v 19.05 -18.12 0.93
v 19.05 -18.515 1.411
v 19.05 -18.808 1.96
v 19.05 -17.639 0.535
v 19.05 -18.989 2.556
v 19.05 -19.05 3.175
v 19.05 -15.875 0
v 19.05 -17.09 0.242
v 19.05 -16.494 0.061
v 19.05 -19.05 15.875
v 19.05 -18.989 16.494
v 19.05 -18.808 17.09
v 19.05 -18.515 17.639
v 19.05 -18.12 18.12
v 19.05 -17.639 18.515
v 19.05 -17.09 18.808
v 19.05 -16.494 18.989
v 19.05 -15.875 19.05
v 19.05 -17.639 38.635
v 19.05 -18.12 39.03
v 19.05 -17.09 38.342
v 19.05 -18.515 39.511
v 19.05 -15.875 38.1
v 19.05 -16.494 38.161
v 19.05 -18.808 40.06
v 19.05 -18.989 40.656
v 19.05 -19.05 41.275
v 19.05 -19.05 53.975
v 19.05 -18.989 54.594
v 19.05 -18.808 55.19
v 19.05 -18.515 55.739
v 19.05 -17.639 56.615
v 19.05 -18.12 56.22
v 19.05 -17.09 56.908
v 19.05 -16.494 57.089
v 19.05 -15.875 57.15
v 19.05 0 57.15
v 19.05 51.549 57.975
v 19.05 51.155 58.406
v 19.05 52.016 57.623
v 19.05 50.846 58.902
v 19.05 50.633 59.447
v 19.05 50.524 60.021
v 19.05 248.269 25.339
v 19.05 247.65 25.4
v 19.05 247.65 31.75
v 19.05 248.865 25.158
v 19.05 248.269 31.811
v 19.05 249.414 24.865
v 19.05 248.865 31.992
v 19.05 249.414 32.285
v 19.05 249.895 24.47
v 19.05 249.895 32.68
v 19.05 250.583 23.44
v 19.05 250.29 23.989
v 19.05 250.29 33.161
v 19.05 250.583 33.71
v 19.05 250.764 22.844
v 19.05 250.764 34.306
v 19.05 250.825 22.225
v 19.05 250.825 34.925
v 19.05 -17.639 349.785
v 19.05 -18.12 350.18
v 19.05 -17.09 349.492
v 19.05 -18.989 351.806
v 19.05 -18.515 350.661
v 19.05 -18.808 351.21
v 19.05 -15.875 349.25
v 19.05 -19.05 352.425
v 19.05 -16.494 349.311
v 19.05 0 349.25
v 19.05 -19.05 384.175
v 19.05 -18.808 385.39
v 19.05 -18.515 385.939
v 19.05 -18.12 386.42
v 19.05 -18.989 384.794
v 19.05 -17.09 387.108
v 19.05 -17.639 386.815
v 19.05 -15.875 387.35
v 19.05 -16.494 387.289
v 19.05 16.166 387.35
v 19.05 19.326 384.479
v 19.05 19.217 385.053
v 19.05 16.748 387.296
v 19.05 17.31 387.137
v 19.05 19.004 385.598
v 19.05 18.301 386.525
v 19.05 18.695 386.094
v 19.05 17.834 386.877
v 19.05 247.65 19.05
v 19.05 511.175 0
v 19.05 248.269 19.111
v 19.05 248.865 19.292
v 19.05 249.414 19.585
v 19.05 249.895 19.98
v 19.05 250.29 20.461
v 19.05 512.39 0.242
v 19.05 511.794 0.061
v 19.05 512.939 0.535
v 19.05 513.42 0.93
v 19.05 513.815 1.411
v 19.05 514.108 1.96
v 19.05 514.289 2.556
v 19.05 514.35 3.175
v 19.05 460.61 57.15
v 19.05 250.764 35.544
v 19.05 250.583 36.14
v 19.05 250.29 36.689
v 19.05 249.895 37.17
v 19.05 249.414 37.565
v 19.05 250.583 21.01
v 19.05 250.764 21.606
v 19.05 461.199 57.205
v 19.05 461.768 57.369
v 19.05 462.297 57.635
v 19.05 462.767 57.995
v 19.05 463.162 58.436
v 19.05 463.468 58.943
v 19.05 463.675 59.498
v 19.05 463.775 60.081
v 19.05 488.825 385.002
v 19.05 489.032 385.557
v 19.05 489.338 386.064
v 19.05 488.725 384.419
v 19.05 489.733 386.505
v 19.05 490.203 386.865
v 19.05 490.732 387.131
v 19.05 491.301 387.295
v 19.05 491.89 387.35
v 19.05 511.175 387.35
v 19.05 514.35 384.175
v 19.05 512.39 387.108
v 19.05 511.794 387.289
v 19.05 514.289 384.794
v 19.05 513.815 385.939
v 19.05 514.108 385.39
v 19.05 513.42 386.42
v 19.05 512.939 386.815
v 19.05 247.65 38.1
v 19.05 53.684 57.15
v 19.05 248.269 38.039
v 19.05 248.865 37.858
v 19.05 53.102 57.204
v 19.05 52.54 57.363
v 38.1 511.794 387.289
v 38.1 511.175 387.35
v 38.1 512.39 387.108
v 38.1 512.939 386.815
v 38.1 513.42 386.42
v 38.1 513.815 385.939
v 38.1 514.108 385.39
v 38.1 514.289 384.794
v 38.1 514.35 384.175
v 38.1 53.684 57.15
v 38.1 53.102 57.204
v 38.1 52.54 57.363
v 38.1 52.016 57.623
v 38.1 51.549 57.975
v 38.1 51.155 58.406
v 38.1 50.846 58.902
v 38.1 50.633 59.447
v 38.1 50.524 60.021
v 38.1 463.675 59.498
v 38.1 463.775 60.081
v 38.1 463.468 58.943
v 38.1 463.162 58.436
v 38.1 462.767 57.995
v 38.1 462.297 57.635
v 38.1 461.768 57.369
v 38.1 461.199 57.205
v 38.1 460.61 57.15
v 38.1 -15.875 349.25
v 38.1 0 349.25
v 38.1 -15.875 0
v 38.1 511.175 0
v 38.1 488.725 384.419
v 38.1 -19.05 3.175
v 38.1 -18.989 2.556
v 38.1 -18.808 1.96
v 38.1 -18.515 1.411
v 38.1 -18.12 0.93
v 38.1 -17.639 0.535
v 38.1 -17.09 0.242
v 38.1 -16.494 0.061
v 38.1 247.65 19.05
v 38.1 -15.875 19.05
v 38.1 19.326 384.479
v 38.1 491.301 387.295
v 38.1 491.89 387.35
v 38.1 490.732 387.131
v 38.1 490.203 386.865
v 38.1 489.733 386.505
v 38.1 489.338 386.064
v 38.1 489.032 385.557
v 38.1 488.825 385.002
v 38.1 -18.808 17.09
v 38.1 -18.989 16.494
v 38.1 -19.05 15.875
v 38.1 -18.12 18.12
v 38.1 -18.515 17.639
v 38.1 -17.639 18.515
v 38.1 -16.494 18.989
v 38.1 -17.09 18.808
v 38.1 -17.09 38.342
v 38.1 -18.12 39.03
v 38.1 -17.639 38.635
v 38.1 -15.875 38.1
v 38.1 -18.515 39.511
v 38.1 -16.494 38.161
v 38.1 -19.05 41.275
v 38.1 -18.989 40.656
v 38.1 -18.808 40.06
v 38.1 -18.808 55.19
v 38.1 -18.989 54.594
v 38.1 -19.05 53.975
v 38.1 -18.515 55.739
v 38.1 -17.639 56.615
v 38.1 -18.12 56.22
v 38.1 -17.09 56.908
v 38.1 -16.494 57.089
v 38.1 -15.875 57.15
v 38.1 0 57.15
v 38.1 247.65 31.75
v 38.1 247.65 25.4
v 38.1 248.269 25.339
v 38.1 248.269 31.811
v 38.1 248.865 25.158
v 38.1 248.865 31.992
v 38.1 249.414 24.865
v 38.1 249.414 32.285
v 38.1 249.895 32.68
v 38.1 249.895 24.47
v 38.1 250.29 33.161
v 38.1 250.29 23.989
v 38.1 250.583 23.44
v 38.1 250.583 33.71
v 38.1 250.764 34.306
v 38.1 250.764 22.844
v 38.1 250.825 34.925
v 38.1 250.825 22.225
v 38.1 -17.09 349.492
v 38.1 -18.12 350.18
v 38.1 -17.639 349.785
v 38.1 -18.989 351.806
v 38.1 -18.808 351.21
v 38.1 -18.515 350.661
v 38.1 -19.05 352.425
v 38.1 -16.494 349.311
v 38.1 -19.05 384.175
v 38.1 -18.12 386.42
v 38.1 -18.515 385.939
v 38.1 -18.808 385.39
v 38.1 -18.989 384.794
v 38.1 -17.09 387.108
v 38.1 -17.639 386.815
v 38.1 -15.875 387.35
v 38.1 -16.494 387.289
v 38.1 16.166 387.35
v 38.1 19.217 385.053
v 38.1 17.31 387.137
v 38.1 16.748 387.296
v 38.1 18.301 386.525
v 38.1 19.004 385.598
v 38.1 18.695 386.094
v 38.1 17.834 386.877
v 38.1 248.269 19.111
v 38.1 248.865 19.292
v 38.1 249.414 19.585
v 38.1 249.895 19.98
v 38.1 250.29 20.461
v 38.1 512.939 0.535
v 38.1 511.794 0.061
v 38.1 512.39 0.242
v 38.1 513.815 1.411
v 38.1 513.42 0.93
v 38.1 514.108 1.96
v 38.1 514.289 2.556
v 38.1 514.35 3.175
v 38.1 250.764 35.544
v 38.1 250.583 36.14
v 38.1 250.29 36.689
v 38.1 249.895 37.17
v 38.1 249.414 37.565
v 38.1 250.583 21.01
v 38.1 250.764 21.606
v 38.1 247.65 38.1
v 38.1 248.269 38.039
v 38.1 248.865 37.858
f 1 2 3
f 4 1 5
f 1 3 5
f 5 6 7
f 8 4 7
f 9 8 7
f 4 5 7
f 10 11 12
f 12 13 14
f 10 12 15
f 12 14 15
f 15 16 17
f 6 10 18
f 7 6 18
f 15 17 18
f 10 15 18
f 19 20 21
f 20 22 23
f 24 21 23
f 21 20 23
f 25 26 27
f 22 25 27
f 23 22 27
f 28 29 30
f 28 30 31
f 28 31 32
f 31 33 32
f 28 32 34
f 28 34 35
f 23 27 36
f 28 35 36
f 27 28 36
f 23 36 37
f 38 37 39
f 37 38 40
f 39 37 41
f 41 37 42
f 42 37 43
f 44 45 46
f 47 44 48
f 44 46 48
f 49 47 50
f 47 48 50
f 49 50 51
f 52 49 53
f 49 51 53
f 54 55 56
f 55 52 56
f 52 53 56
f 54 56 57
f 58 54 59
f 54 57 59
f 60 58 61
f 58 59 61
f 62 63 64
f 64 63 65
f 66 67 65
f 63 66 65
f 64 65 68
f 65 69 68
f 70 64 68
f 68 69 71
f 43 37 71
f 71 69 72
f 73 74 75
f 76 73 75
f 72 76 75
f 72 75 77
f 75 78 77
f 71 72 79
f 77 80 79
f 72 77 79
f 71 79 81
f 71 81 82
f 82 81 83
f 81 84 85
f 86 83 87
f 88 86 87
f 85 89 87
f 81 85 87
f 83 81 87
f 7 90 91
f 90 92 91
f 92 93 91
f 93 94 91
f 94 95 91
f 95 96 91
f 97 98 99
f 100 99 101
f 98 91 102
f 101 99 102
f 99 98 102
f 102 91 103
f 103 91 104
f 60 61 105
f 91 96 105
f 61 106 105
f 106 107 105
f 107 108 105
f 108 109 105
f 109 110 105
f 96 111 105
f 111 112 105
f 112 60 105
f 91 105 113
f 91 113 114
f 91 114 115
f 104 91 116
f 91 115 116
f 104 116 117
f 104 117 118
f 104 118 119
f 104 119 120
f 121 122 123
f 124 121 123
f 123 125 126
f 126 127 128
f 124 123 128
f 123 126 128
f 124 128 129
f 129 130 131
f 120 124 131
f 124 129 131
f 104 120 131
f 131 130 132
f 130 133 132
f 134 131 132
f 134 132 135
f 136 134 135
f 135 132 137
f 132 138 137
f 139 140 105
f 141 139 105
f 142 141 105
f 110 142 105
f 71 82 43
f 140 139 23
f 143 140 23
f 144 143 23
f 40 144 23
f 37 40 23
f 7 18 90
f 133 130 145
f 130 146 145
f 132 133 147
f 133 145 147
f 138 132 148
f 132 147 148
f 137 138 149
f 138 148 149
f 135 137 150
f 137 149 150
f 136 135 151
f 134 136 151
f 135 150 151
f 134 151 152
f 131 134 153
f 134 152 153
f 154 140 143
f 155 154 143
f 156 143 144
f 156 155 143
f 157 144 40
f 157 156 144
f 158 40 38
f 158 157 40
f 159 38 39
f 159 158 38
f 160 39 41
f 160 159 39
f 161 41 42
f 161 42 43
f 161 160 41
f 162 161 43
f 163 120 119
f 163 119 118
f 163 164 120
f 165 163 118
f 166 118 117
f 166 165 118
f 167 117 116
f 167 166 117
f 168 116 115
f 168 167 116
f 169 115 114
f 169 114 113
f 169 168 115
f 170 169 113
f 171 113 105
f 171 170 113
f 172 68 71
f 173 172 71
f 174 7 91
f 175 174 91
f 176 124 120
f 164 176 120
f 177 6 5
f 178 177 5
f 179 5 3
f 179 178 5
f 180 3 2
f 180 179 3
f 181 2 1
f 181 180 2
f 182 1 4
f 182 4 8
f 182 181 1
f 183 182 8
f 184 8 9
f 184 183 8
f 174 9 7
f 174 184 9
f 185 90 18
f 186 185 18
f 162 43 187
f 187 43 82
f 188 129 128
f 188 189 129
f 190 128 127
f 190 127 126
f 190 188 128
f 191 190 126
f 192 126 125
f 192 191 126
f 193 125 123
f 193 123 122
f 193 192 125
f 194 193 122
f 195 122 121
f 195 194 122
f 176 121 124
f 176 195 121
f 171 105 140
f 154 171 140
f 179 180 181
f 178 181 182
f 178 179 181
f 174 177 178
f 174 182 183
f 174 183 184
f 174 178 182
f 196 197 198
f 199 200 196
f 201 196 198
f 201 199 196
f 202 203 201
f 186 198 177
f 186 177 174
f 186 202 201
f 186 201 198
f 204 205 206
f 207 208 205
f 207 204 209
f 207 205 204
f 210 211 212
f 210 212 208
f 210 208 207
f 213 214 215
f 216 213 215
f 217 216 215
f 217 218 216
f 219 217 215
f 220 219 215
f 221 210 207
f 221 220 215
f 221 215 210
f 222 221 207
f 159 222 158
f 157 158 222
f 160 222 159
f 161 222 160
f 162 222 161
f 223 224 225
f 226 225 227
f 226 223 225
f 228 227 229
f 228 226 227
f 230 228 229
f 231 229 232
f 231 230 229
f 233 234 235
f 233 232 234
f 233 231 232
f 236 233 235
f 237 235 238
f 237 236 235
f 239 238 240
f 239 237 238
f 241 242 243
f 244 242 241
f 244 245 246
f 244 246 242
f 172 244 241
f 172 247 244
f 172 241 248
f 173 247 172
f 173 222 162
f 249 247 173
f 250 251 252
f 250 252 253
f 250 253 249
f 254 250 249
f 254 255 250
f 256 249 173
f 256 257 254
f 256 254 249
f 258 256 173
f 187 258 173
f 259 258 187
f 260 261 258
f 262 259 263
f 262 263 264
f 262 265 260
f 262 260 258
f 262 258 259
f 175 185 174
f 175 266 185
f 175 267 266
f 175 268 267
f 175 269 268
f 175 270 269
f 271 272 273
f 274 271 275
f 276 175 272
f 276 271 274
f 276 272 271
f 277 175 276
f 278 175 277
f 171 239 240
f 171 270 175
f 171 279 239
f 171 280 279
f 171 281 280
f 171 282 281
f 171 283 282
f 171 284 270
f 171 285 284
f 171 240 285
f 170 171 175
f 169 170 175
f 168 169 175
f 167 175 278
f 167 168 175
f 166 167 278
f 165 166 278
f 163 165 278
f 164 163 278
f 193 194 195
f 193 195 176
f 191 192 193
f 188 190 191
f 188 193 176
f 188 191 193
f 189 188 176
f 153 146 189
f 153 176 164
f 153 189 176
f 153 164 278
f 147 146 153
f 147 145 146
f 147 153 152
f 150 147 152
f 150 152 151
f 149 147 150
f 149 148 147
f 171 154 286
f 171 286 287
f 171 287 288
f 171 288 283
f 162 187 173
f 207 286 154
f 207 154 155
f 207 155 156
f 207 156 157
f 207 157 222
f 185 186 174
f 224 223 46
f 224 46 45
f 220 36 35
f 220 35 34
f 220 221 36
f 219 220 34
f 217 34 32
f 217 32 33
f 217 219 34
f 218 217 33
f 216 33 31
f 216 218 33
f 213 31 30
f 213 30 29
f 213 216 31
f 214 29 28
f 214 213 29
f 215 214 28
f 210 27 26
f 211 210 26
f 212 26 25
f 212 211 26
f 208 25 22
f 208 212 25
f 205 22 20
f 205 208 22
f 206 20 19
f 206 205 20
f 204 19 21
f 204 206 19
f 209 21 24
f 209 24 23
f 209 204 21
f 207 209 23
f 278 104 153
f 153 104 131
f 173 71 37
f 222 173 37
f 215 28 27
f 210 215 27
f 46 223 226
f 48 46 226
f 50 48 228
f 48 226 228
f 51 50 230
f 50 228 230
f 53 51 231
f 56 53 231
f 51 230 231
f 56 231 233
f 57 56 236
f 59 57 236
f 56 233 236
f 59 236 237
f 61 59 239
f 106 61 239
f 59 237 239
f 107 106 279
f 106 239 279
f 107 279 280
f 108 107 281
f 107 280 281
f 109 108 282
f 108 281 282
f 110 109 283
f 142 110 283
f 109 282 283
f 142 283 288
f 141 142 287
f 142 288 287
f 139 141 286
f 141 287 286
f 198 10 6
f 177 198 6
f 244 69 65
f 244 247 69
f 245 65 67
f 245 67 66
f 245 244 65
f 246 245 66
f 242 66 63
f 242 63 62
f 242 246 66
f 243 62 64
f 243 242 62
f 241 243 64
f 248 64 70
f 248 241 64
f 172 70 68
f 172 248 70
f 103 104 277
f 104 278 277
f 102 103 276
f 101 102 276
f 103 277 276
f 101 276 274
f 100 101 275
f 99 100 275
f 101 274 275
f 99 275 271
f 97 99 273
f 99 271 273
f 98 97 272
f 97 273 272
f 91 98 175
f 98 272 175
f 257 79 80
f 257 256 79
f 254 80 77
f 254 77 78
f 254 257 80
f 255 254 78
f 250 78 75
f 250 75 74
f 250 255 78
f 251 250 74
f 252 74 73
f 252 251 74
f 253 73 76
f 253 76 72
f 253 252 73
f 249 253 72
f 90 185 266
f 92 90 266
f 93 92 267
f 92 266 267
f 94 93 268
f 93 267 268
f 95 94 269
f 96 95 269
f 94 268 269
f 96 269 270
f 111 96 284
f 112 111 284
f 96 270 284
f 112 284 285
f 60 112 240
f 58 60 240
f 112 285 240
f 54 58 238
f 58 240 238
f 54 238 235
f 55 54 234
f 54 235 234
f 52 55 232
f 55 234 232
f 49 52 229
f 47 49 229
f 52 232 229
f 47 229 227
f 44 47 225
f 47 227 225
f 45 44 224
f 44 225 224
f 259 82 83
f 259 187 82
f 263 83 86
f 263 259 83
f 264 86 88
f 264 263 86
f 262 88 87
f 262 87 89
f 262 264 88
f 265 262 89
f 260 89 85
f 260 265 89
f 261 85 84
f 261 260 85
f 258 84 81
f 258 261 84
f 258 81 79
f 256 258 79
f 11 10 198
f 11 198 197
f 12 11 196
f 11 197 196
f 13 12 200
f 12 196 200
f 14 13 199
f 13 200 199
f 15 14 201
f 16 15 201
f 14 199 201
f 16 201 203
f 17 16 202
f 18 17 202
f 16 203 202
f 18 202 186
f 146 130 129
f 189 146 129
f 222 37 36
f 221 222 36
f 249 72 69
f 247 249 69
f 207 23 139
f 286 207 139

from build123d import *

# Parameters (mm, degrees)
F2_DEPTH = 19.05
F3_R     = 3.175
F5_DEPTH = 19.05
F6_R     = 3.175


with BuildPart() as f2:
    # F1 (on offset) → F2 (new body)
    with BuildSketch(Plane.YZ.offset(19.05)):
        Polygon((-19.05, 19.05), (-19.05, 0), (514.35, 0), (514.35, 387.35), (488.95, 387.35), (463.55, 57.15), (50.8, 57.15), (19.05, 387.35), (-19.05, 387.35), (-19.05, 349.25), (0, 349.25), (0, 57.15), (-19.05, 57.15), (-19.05, 38.1), (247.65, 38.1), (247.65, 19.05), align=None)
    extrude(amount=F2_DEPTH)

    # F3
    f3_edges = [f2.edges().sort_by_distance(p)[0] for p in [
        (28.575, -19.05, 0),
        (28.575, -19.05, 19.05),
        (28.575, -19.05, 38.1),
        (28.575, -19.05, 57.15),
        (28.575, -19.05, 349.25),
        (28.575, -19.05, 387.35),
        (28.575, 19.05, 387.35),
        (28.575, 50.8, 57.15),
        (28.575, 463.55, 57.15),
        (28.575, 488.95, 387.35),
    ]]
    fillet(f3_edges, radius=F3_R)

    # F4 (on face) → F5 (cut)
    with BuildSketch(Plane.YZ.offset(38.1)):
        with BuildLine():
            Line((247.65, 25.4), (247.65, 19.05))
            ThreePointArc((247.65, 19.05), (250.825, 22.225), (247.65, 25.4))
        make_face()
        with BuildLine():
            ThreePointArc((247.65, 31.75), (250.825, 34.925), (247.65, 38.1))
            Line((247.65, 38.1), (247.65, 31.75))
        make_face()
    extrude(amount=-F5_DEPTH, mode=Mode.SUBTRACT)

    # F6
    f6_edges = [f2.edges().sort_by_distance(p)[0] for p in [
        (28.575, 514.35, 0),
        (28.575, 514.35, 387.35),
    ]]
    fillet(f6_edges, radius=F6_R)


solid = f2.part
